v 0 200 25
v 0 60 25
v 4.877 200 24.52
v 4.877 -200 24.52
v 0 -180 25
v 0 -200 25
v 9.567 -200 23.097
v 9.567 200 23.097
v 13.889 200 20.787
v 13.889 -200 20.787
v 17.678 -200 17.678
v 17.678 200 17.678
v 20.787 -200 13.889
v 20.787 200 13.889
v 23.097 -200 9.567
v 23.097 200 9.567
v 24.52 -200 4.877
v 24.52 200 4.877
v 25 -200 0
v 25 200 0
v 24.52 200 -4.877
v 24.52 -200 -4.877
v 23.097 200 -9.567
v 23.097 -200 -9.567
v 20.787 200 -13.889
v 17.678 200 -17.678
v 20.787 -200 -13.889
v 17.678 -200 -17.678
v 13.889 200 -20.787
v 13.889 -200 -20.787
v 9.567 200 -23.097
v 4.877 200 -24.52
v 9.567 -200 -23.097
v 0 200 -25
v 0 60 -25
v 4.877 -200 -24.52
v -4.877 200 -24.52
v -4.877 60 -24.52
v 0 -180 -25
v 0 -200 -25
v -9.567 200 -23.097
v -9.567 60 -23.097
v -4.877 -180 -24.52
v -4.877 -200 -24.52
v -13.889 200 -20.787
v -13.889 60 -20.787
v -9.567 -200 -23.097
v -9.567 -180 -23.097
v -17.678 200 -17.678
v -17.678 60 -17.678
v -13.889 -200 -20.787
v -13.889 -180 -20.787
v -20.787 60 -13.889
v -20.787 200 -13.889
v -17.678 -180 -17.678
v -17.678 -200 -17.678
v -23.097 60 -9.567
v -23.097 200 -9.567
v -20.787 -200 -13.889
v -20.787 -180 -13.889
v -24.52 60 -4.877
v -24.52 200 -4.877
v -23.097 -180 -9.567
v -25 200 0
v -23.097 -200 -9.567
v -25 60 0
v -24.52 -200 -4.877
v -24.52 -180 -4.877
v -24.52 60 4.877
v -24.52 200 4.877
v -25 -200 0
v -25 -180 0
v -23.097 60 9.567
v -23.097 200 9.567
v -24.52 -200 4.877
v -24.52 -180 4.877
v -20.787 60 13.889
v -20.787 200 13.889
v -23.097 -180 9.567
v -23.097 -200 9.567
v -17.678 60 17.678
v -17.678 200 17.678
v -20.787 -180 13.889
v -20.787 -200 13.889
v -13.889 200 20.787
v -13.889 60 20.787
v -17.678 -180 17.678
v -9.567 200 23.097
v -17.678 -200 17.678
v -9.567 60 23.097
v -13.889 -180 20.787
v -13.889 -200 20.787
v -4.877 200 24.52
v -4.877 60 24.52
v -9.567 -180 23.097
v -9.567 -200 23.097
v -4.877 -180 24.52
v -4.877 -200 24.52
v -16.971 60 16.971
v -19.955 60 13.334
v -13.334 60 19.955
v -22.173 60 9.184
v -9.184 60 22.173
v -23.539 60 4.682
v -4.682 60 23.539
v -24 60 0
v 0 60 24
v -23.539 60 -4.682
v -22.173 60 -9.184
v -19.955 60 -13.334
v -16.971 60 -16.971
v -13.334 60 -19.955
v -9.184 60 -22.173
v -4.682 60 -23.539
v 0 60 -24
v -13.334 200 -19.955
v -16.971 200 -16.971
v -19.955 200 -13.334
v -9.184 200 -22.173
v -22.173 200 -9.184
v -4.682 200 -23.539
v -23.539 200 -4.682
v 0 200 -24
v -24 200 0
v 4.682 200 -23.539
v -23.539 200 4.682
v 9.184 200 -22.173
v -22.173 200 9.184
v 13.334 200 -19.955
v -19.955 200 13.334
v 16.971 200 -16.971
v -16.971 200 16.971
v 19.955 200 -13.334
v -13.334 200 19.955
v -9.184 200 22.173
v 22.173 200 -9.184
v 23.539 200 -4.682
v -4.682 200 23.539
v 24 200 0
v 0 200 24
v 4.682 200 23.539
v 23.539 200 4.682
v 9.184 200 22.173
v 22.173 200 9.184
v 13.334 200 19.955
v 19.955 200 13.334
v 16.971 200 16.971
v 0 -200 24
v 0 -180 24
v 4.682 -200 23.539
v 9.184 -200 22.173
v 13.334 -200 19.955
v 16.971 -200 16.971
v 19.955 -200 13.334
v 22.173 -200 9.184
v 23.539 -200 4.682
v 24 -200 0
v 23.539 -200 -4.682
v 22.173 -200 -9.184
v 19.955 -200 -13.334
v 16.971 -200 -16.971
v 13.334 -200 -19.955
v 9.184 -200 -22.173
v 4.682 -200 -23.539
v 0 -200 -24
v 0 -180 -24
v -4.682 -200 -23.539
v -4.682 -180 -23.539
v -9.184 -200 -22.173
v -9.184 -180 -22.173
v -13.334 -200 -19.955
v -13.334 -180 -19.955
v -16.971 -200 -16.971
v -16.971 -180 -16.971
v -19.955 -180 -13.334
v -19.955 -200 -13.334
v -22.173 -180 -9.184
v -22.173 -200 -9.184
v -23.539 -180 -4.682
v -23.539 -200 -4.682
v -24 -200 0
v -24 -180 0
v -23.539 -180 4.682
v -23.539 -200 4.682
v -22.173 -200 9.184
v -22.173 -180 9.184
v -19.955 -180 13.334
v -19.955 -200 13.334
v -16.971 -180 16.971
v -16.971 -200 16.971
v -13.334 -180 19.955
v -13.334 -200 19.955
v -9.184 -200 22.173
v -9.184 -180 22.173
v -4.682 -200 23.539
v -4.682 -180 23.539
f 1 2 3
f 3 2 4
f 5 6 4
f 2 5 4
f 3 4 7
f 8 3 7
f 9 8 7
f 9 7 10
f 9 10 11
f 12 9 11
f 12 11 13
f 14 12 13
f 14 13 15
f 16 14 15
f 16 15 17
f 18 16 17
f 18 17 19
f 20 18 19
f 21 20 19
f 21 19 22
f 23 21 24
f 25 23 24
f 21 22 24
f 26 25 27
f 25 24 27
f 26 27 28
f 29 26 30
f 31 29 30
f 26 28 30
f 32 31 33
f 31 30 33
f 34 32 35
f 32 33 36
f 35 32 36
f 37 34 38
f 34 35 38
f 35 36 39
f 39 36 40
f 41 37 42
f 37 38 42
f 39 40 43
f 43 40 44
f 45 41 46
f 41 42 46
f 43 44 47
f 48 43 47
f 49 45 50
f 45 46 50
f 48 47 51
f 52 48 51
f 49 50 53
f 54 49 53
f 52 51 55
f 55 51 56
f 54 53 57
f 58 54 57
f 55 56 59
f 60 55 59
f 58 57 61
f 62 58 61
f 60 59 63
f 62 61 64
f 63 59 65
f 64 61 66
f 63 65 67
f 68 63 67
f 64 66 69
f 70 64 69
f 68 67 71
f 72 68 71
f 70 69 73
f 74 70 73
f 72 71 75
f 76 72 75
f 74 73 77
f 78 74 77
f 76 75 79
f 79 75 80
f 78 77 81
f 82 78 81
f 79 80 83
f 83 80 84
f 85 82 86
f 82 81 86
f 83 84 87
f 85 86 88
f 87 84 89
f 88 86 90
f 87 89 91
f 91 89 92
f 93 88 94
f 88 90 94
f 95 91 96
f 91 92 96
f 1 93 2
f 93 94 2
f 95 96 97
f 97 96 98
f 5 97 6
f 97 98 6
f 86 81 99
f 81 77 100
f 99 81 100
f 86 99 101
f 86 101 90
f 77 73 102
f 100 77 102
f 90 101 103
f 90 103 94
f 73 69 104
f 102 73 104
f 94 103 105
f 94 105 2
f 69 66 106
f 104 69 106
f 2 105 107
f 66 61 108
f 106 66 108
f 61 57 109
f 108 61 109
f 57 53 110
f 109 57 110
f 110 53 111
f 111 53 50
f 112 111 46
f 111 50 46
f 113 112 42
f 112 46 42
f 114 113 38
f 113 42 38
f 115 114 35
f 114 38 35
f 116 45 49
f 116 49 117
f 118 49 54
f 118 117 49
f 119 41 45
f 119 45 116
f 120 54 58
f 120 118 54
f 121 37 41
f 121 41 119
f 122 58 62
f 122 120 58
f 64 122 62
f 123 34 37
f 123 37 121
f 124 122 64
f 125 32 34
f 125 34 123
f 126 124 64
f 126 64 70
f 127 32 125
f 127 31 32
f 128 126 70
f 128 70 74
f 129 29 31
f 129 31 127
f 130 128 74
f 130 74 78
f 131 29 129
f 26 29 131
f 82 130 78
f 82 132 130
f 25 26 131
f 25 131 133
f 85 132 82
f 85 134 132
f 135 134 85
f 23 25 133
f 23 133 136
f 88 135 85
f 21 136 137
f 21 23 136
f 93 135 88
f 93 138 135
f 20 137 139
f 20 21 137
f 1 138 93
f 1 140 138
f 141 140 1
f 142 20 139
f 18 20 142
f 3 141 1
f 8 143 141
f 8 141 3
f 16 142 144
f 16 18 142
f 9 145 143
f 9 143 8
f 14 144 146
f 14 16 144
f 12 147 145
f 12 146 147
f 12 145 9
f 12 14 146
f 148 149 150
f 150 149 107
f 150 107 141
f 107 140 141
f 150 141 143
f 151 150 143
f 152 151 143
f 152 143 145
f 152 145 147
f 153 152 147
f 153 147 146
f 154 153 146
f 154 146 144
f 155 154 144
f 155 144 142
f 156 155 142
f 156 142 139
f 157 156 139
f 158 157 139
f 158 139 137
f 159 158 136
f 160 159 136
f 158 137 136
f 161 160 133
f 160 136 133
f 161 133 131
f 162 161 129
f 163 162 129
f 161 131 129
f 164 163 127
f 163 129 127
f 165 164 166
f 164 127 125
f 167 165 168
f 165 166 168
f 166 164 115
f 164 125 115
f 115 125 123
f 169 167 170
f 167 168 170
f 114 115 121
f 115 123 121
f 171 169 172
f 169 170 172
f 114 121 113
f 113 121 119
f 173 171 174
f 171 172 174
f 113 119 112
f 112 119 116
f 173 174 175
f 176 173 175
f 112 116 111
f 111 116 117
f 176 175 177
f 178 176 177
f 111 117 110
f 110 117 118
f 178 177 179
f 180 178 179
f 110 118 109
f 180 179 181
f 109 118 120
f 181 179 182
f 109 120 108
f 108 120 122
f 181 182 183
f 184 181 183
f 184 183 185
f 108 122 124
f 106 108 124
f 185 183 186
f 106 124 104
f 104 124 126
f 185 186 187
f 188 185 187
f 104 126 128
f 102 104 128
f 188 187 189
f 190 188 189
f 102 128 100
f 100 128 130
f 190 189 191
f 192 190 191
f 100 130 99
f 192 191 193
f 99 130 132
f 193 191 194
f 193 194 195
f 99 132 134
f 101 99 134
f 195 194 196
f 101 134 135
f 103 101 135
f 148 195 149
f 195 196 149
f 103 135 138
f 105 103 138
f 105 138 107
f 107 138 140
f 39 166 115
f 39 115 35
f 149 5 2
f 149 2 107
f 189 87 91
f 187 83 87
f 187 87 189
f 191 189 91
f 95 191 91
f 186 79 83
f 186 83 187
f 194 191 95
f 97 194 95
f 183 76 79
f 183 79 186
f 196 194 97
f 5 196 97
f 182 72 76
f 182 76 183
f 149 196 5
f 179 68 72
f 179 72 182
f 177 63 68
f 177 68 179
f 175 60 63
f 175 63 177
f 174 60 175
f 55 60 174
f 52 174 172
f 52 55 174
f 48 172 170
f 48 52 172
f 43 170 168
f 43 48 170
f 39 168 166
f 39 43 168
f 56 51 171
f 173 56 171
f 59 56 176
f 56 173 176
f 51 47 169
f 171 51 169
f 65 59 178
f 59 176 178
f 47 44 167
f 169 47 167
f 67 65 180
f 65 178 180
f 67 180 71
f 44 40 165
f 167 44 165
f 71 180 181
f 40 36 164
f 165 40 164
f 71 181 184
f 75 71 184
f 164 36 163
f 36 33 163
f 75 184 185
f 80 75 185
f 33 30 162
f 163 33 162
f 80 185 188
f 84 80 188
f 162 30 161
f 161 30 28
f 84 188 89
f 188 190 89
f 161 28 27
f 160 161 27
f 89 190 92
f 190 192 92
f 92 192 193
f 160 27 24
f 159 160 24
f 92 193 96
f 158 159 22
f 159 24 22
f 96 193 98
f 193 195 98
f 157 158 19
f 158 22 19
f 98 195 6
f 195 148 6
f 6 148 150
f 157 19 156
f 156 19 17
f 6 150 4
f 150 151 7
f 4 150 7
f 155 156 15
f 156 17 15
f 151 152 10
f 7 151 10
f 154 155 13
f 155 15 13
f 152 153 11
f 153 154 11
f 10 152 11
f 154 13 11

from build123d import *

# Parameters (mm, degrees)
BOSS_EXTRU_1_DEPTH           = 200
BOSS_EXTRU_1_DEPTH_BACK      = 200
ESQUISSE1_R                  = 25
ESQUISSE2_R                  = 24
ENL_V_MAT_EXTRU_1_DEPTH      = 400
ENL_V_MAT_EXTRU_2_DEPTH      = 60
ENL_V_MAT_EXTRU_2_DEPTH_BACK = 180
ESQUISSE3_W                  = 240
ESQUISSE3_H                  = 600


with BuildPart() as part:
    # Esquisse1 → Boss.-Extru.1 (new, two sides: drawn at the far end of the back side and taken through both)
    with BuildSketch(Plane(origin=(0, 0, 0), x_dir=(1, 0, 0), z_dir=(0, 1, 0)).offset(-BOSS_EXTRU_1_DEPTH_BACK)):
        Circle(ESQUISSE1_R)
    extrude(amount=BOSS_EXTRU_1_DEPTH + BOSS_EXTRU_1_DEPTH_BACK)

    # Esquisse2 → Enlèv. mat.-Extru.1 (cut)
    with BuildSketch(Plane(origin=(0, 200, 0), x_dir=(1, 0, 0), z_dir=(0, 1, 0))):
        Circle(ESQUISSE2_R)
    extrude(amount=-ENL_V_MAT_EXTRU_1_DEPTH, mode=Mode.SUBTRACT)

    # Esquisse3 → Enlèv. mat.-Extru.2 (cut, two sides: drawn at the far end of the back side and taken through both)
    with BuildSketch(Plane(origin=(0, 0, 0), x_dir=(1, 0, 0), z_dir=(0, 1, 0)).offset(-ENL_V_MAT_EXTRU_2_DEPTH_BACK)):
        with Locations((-120, 0)):
            Rectangle(ESQUISSE3_W, ESQUISSE3_H)
    extrude(amount=ENL_V_MAT_EXTRU_2_DEPTH + ENL_V_MAT_EXTRU_2_DEPTH_BACK, mode=Mode.SUBTRACT)


solid = part.part
